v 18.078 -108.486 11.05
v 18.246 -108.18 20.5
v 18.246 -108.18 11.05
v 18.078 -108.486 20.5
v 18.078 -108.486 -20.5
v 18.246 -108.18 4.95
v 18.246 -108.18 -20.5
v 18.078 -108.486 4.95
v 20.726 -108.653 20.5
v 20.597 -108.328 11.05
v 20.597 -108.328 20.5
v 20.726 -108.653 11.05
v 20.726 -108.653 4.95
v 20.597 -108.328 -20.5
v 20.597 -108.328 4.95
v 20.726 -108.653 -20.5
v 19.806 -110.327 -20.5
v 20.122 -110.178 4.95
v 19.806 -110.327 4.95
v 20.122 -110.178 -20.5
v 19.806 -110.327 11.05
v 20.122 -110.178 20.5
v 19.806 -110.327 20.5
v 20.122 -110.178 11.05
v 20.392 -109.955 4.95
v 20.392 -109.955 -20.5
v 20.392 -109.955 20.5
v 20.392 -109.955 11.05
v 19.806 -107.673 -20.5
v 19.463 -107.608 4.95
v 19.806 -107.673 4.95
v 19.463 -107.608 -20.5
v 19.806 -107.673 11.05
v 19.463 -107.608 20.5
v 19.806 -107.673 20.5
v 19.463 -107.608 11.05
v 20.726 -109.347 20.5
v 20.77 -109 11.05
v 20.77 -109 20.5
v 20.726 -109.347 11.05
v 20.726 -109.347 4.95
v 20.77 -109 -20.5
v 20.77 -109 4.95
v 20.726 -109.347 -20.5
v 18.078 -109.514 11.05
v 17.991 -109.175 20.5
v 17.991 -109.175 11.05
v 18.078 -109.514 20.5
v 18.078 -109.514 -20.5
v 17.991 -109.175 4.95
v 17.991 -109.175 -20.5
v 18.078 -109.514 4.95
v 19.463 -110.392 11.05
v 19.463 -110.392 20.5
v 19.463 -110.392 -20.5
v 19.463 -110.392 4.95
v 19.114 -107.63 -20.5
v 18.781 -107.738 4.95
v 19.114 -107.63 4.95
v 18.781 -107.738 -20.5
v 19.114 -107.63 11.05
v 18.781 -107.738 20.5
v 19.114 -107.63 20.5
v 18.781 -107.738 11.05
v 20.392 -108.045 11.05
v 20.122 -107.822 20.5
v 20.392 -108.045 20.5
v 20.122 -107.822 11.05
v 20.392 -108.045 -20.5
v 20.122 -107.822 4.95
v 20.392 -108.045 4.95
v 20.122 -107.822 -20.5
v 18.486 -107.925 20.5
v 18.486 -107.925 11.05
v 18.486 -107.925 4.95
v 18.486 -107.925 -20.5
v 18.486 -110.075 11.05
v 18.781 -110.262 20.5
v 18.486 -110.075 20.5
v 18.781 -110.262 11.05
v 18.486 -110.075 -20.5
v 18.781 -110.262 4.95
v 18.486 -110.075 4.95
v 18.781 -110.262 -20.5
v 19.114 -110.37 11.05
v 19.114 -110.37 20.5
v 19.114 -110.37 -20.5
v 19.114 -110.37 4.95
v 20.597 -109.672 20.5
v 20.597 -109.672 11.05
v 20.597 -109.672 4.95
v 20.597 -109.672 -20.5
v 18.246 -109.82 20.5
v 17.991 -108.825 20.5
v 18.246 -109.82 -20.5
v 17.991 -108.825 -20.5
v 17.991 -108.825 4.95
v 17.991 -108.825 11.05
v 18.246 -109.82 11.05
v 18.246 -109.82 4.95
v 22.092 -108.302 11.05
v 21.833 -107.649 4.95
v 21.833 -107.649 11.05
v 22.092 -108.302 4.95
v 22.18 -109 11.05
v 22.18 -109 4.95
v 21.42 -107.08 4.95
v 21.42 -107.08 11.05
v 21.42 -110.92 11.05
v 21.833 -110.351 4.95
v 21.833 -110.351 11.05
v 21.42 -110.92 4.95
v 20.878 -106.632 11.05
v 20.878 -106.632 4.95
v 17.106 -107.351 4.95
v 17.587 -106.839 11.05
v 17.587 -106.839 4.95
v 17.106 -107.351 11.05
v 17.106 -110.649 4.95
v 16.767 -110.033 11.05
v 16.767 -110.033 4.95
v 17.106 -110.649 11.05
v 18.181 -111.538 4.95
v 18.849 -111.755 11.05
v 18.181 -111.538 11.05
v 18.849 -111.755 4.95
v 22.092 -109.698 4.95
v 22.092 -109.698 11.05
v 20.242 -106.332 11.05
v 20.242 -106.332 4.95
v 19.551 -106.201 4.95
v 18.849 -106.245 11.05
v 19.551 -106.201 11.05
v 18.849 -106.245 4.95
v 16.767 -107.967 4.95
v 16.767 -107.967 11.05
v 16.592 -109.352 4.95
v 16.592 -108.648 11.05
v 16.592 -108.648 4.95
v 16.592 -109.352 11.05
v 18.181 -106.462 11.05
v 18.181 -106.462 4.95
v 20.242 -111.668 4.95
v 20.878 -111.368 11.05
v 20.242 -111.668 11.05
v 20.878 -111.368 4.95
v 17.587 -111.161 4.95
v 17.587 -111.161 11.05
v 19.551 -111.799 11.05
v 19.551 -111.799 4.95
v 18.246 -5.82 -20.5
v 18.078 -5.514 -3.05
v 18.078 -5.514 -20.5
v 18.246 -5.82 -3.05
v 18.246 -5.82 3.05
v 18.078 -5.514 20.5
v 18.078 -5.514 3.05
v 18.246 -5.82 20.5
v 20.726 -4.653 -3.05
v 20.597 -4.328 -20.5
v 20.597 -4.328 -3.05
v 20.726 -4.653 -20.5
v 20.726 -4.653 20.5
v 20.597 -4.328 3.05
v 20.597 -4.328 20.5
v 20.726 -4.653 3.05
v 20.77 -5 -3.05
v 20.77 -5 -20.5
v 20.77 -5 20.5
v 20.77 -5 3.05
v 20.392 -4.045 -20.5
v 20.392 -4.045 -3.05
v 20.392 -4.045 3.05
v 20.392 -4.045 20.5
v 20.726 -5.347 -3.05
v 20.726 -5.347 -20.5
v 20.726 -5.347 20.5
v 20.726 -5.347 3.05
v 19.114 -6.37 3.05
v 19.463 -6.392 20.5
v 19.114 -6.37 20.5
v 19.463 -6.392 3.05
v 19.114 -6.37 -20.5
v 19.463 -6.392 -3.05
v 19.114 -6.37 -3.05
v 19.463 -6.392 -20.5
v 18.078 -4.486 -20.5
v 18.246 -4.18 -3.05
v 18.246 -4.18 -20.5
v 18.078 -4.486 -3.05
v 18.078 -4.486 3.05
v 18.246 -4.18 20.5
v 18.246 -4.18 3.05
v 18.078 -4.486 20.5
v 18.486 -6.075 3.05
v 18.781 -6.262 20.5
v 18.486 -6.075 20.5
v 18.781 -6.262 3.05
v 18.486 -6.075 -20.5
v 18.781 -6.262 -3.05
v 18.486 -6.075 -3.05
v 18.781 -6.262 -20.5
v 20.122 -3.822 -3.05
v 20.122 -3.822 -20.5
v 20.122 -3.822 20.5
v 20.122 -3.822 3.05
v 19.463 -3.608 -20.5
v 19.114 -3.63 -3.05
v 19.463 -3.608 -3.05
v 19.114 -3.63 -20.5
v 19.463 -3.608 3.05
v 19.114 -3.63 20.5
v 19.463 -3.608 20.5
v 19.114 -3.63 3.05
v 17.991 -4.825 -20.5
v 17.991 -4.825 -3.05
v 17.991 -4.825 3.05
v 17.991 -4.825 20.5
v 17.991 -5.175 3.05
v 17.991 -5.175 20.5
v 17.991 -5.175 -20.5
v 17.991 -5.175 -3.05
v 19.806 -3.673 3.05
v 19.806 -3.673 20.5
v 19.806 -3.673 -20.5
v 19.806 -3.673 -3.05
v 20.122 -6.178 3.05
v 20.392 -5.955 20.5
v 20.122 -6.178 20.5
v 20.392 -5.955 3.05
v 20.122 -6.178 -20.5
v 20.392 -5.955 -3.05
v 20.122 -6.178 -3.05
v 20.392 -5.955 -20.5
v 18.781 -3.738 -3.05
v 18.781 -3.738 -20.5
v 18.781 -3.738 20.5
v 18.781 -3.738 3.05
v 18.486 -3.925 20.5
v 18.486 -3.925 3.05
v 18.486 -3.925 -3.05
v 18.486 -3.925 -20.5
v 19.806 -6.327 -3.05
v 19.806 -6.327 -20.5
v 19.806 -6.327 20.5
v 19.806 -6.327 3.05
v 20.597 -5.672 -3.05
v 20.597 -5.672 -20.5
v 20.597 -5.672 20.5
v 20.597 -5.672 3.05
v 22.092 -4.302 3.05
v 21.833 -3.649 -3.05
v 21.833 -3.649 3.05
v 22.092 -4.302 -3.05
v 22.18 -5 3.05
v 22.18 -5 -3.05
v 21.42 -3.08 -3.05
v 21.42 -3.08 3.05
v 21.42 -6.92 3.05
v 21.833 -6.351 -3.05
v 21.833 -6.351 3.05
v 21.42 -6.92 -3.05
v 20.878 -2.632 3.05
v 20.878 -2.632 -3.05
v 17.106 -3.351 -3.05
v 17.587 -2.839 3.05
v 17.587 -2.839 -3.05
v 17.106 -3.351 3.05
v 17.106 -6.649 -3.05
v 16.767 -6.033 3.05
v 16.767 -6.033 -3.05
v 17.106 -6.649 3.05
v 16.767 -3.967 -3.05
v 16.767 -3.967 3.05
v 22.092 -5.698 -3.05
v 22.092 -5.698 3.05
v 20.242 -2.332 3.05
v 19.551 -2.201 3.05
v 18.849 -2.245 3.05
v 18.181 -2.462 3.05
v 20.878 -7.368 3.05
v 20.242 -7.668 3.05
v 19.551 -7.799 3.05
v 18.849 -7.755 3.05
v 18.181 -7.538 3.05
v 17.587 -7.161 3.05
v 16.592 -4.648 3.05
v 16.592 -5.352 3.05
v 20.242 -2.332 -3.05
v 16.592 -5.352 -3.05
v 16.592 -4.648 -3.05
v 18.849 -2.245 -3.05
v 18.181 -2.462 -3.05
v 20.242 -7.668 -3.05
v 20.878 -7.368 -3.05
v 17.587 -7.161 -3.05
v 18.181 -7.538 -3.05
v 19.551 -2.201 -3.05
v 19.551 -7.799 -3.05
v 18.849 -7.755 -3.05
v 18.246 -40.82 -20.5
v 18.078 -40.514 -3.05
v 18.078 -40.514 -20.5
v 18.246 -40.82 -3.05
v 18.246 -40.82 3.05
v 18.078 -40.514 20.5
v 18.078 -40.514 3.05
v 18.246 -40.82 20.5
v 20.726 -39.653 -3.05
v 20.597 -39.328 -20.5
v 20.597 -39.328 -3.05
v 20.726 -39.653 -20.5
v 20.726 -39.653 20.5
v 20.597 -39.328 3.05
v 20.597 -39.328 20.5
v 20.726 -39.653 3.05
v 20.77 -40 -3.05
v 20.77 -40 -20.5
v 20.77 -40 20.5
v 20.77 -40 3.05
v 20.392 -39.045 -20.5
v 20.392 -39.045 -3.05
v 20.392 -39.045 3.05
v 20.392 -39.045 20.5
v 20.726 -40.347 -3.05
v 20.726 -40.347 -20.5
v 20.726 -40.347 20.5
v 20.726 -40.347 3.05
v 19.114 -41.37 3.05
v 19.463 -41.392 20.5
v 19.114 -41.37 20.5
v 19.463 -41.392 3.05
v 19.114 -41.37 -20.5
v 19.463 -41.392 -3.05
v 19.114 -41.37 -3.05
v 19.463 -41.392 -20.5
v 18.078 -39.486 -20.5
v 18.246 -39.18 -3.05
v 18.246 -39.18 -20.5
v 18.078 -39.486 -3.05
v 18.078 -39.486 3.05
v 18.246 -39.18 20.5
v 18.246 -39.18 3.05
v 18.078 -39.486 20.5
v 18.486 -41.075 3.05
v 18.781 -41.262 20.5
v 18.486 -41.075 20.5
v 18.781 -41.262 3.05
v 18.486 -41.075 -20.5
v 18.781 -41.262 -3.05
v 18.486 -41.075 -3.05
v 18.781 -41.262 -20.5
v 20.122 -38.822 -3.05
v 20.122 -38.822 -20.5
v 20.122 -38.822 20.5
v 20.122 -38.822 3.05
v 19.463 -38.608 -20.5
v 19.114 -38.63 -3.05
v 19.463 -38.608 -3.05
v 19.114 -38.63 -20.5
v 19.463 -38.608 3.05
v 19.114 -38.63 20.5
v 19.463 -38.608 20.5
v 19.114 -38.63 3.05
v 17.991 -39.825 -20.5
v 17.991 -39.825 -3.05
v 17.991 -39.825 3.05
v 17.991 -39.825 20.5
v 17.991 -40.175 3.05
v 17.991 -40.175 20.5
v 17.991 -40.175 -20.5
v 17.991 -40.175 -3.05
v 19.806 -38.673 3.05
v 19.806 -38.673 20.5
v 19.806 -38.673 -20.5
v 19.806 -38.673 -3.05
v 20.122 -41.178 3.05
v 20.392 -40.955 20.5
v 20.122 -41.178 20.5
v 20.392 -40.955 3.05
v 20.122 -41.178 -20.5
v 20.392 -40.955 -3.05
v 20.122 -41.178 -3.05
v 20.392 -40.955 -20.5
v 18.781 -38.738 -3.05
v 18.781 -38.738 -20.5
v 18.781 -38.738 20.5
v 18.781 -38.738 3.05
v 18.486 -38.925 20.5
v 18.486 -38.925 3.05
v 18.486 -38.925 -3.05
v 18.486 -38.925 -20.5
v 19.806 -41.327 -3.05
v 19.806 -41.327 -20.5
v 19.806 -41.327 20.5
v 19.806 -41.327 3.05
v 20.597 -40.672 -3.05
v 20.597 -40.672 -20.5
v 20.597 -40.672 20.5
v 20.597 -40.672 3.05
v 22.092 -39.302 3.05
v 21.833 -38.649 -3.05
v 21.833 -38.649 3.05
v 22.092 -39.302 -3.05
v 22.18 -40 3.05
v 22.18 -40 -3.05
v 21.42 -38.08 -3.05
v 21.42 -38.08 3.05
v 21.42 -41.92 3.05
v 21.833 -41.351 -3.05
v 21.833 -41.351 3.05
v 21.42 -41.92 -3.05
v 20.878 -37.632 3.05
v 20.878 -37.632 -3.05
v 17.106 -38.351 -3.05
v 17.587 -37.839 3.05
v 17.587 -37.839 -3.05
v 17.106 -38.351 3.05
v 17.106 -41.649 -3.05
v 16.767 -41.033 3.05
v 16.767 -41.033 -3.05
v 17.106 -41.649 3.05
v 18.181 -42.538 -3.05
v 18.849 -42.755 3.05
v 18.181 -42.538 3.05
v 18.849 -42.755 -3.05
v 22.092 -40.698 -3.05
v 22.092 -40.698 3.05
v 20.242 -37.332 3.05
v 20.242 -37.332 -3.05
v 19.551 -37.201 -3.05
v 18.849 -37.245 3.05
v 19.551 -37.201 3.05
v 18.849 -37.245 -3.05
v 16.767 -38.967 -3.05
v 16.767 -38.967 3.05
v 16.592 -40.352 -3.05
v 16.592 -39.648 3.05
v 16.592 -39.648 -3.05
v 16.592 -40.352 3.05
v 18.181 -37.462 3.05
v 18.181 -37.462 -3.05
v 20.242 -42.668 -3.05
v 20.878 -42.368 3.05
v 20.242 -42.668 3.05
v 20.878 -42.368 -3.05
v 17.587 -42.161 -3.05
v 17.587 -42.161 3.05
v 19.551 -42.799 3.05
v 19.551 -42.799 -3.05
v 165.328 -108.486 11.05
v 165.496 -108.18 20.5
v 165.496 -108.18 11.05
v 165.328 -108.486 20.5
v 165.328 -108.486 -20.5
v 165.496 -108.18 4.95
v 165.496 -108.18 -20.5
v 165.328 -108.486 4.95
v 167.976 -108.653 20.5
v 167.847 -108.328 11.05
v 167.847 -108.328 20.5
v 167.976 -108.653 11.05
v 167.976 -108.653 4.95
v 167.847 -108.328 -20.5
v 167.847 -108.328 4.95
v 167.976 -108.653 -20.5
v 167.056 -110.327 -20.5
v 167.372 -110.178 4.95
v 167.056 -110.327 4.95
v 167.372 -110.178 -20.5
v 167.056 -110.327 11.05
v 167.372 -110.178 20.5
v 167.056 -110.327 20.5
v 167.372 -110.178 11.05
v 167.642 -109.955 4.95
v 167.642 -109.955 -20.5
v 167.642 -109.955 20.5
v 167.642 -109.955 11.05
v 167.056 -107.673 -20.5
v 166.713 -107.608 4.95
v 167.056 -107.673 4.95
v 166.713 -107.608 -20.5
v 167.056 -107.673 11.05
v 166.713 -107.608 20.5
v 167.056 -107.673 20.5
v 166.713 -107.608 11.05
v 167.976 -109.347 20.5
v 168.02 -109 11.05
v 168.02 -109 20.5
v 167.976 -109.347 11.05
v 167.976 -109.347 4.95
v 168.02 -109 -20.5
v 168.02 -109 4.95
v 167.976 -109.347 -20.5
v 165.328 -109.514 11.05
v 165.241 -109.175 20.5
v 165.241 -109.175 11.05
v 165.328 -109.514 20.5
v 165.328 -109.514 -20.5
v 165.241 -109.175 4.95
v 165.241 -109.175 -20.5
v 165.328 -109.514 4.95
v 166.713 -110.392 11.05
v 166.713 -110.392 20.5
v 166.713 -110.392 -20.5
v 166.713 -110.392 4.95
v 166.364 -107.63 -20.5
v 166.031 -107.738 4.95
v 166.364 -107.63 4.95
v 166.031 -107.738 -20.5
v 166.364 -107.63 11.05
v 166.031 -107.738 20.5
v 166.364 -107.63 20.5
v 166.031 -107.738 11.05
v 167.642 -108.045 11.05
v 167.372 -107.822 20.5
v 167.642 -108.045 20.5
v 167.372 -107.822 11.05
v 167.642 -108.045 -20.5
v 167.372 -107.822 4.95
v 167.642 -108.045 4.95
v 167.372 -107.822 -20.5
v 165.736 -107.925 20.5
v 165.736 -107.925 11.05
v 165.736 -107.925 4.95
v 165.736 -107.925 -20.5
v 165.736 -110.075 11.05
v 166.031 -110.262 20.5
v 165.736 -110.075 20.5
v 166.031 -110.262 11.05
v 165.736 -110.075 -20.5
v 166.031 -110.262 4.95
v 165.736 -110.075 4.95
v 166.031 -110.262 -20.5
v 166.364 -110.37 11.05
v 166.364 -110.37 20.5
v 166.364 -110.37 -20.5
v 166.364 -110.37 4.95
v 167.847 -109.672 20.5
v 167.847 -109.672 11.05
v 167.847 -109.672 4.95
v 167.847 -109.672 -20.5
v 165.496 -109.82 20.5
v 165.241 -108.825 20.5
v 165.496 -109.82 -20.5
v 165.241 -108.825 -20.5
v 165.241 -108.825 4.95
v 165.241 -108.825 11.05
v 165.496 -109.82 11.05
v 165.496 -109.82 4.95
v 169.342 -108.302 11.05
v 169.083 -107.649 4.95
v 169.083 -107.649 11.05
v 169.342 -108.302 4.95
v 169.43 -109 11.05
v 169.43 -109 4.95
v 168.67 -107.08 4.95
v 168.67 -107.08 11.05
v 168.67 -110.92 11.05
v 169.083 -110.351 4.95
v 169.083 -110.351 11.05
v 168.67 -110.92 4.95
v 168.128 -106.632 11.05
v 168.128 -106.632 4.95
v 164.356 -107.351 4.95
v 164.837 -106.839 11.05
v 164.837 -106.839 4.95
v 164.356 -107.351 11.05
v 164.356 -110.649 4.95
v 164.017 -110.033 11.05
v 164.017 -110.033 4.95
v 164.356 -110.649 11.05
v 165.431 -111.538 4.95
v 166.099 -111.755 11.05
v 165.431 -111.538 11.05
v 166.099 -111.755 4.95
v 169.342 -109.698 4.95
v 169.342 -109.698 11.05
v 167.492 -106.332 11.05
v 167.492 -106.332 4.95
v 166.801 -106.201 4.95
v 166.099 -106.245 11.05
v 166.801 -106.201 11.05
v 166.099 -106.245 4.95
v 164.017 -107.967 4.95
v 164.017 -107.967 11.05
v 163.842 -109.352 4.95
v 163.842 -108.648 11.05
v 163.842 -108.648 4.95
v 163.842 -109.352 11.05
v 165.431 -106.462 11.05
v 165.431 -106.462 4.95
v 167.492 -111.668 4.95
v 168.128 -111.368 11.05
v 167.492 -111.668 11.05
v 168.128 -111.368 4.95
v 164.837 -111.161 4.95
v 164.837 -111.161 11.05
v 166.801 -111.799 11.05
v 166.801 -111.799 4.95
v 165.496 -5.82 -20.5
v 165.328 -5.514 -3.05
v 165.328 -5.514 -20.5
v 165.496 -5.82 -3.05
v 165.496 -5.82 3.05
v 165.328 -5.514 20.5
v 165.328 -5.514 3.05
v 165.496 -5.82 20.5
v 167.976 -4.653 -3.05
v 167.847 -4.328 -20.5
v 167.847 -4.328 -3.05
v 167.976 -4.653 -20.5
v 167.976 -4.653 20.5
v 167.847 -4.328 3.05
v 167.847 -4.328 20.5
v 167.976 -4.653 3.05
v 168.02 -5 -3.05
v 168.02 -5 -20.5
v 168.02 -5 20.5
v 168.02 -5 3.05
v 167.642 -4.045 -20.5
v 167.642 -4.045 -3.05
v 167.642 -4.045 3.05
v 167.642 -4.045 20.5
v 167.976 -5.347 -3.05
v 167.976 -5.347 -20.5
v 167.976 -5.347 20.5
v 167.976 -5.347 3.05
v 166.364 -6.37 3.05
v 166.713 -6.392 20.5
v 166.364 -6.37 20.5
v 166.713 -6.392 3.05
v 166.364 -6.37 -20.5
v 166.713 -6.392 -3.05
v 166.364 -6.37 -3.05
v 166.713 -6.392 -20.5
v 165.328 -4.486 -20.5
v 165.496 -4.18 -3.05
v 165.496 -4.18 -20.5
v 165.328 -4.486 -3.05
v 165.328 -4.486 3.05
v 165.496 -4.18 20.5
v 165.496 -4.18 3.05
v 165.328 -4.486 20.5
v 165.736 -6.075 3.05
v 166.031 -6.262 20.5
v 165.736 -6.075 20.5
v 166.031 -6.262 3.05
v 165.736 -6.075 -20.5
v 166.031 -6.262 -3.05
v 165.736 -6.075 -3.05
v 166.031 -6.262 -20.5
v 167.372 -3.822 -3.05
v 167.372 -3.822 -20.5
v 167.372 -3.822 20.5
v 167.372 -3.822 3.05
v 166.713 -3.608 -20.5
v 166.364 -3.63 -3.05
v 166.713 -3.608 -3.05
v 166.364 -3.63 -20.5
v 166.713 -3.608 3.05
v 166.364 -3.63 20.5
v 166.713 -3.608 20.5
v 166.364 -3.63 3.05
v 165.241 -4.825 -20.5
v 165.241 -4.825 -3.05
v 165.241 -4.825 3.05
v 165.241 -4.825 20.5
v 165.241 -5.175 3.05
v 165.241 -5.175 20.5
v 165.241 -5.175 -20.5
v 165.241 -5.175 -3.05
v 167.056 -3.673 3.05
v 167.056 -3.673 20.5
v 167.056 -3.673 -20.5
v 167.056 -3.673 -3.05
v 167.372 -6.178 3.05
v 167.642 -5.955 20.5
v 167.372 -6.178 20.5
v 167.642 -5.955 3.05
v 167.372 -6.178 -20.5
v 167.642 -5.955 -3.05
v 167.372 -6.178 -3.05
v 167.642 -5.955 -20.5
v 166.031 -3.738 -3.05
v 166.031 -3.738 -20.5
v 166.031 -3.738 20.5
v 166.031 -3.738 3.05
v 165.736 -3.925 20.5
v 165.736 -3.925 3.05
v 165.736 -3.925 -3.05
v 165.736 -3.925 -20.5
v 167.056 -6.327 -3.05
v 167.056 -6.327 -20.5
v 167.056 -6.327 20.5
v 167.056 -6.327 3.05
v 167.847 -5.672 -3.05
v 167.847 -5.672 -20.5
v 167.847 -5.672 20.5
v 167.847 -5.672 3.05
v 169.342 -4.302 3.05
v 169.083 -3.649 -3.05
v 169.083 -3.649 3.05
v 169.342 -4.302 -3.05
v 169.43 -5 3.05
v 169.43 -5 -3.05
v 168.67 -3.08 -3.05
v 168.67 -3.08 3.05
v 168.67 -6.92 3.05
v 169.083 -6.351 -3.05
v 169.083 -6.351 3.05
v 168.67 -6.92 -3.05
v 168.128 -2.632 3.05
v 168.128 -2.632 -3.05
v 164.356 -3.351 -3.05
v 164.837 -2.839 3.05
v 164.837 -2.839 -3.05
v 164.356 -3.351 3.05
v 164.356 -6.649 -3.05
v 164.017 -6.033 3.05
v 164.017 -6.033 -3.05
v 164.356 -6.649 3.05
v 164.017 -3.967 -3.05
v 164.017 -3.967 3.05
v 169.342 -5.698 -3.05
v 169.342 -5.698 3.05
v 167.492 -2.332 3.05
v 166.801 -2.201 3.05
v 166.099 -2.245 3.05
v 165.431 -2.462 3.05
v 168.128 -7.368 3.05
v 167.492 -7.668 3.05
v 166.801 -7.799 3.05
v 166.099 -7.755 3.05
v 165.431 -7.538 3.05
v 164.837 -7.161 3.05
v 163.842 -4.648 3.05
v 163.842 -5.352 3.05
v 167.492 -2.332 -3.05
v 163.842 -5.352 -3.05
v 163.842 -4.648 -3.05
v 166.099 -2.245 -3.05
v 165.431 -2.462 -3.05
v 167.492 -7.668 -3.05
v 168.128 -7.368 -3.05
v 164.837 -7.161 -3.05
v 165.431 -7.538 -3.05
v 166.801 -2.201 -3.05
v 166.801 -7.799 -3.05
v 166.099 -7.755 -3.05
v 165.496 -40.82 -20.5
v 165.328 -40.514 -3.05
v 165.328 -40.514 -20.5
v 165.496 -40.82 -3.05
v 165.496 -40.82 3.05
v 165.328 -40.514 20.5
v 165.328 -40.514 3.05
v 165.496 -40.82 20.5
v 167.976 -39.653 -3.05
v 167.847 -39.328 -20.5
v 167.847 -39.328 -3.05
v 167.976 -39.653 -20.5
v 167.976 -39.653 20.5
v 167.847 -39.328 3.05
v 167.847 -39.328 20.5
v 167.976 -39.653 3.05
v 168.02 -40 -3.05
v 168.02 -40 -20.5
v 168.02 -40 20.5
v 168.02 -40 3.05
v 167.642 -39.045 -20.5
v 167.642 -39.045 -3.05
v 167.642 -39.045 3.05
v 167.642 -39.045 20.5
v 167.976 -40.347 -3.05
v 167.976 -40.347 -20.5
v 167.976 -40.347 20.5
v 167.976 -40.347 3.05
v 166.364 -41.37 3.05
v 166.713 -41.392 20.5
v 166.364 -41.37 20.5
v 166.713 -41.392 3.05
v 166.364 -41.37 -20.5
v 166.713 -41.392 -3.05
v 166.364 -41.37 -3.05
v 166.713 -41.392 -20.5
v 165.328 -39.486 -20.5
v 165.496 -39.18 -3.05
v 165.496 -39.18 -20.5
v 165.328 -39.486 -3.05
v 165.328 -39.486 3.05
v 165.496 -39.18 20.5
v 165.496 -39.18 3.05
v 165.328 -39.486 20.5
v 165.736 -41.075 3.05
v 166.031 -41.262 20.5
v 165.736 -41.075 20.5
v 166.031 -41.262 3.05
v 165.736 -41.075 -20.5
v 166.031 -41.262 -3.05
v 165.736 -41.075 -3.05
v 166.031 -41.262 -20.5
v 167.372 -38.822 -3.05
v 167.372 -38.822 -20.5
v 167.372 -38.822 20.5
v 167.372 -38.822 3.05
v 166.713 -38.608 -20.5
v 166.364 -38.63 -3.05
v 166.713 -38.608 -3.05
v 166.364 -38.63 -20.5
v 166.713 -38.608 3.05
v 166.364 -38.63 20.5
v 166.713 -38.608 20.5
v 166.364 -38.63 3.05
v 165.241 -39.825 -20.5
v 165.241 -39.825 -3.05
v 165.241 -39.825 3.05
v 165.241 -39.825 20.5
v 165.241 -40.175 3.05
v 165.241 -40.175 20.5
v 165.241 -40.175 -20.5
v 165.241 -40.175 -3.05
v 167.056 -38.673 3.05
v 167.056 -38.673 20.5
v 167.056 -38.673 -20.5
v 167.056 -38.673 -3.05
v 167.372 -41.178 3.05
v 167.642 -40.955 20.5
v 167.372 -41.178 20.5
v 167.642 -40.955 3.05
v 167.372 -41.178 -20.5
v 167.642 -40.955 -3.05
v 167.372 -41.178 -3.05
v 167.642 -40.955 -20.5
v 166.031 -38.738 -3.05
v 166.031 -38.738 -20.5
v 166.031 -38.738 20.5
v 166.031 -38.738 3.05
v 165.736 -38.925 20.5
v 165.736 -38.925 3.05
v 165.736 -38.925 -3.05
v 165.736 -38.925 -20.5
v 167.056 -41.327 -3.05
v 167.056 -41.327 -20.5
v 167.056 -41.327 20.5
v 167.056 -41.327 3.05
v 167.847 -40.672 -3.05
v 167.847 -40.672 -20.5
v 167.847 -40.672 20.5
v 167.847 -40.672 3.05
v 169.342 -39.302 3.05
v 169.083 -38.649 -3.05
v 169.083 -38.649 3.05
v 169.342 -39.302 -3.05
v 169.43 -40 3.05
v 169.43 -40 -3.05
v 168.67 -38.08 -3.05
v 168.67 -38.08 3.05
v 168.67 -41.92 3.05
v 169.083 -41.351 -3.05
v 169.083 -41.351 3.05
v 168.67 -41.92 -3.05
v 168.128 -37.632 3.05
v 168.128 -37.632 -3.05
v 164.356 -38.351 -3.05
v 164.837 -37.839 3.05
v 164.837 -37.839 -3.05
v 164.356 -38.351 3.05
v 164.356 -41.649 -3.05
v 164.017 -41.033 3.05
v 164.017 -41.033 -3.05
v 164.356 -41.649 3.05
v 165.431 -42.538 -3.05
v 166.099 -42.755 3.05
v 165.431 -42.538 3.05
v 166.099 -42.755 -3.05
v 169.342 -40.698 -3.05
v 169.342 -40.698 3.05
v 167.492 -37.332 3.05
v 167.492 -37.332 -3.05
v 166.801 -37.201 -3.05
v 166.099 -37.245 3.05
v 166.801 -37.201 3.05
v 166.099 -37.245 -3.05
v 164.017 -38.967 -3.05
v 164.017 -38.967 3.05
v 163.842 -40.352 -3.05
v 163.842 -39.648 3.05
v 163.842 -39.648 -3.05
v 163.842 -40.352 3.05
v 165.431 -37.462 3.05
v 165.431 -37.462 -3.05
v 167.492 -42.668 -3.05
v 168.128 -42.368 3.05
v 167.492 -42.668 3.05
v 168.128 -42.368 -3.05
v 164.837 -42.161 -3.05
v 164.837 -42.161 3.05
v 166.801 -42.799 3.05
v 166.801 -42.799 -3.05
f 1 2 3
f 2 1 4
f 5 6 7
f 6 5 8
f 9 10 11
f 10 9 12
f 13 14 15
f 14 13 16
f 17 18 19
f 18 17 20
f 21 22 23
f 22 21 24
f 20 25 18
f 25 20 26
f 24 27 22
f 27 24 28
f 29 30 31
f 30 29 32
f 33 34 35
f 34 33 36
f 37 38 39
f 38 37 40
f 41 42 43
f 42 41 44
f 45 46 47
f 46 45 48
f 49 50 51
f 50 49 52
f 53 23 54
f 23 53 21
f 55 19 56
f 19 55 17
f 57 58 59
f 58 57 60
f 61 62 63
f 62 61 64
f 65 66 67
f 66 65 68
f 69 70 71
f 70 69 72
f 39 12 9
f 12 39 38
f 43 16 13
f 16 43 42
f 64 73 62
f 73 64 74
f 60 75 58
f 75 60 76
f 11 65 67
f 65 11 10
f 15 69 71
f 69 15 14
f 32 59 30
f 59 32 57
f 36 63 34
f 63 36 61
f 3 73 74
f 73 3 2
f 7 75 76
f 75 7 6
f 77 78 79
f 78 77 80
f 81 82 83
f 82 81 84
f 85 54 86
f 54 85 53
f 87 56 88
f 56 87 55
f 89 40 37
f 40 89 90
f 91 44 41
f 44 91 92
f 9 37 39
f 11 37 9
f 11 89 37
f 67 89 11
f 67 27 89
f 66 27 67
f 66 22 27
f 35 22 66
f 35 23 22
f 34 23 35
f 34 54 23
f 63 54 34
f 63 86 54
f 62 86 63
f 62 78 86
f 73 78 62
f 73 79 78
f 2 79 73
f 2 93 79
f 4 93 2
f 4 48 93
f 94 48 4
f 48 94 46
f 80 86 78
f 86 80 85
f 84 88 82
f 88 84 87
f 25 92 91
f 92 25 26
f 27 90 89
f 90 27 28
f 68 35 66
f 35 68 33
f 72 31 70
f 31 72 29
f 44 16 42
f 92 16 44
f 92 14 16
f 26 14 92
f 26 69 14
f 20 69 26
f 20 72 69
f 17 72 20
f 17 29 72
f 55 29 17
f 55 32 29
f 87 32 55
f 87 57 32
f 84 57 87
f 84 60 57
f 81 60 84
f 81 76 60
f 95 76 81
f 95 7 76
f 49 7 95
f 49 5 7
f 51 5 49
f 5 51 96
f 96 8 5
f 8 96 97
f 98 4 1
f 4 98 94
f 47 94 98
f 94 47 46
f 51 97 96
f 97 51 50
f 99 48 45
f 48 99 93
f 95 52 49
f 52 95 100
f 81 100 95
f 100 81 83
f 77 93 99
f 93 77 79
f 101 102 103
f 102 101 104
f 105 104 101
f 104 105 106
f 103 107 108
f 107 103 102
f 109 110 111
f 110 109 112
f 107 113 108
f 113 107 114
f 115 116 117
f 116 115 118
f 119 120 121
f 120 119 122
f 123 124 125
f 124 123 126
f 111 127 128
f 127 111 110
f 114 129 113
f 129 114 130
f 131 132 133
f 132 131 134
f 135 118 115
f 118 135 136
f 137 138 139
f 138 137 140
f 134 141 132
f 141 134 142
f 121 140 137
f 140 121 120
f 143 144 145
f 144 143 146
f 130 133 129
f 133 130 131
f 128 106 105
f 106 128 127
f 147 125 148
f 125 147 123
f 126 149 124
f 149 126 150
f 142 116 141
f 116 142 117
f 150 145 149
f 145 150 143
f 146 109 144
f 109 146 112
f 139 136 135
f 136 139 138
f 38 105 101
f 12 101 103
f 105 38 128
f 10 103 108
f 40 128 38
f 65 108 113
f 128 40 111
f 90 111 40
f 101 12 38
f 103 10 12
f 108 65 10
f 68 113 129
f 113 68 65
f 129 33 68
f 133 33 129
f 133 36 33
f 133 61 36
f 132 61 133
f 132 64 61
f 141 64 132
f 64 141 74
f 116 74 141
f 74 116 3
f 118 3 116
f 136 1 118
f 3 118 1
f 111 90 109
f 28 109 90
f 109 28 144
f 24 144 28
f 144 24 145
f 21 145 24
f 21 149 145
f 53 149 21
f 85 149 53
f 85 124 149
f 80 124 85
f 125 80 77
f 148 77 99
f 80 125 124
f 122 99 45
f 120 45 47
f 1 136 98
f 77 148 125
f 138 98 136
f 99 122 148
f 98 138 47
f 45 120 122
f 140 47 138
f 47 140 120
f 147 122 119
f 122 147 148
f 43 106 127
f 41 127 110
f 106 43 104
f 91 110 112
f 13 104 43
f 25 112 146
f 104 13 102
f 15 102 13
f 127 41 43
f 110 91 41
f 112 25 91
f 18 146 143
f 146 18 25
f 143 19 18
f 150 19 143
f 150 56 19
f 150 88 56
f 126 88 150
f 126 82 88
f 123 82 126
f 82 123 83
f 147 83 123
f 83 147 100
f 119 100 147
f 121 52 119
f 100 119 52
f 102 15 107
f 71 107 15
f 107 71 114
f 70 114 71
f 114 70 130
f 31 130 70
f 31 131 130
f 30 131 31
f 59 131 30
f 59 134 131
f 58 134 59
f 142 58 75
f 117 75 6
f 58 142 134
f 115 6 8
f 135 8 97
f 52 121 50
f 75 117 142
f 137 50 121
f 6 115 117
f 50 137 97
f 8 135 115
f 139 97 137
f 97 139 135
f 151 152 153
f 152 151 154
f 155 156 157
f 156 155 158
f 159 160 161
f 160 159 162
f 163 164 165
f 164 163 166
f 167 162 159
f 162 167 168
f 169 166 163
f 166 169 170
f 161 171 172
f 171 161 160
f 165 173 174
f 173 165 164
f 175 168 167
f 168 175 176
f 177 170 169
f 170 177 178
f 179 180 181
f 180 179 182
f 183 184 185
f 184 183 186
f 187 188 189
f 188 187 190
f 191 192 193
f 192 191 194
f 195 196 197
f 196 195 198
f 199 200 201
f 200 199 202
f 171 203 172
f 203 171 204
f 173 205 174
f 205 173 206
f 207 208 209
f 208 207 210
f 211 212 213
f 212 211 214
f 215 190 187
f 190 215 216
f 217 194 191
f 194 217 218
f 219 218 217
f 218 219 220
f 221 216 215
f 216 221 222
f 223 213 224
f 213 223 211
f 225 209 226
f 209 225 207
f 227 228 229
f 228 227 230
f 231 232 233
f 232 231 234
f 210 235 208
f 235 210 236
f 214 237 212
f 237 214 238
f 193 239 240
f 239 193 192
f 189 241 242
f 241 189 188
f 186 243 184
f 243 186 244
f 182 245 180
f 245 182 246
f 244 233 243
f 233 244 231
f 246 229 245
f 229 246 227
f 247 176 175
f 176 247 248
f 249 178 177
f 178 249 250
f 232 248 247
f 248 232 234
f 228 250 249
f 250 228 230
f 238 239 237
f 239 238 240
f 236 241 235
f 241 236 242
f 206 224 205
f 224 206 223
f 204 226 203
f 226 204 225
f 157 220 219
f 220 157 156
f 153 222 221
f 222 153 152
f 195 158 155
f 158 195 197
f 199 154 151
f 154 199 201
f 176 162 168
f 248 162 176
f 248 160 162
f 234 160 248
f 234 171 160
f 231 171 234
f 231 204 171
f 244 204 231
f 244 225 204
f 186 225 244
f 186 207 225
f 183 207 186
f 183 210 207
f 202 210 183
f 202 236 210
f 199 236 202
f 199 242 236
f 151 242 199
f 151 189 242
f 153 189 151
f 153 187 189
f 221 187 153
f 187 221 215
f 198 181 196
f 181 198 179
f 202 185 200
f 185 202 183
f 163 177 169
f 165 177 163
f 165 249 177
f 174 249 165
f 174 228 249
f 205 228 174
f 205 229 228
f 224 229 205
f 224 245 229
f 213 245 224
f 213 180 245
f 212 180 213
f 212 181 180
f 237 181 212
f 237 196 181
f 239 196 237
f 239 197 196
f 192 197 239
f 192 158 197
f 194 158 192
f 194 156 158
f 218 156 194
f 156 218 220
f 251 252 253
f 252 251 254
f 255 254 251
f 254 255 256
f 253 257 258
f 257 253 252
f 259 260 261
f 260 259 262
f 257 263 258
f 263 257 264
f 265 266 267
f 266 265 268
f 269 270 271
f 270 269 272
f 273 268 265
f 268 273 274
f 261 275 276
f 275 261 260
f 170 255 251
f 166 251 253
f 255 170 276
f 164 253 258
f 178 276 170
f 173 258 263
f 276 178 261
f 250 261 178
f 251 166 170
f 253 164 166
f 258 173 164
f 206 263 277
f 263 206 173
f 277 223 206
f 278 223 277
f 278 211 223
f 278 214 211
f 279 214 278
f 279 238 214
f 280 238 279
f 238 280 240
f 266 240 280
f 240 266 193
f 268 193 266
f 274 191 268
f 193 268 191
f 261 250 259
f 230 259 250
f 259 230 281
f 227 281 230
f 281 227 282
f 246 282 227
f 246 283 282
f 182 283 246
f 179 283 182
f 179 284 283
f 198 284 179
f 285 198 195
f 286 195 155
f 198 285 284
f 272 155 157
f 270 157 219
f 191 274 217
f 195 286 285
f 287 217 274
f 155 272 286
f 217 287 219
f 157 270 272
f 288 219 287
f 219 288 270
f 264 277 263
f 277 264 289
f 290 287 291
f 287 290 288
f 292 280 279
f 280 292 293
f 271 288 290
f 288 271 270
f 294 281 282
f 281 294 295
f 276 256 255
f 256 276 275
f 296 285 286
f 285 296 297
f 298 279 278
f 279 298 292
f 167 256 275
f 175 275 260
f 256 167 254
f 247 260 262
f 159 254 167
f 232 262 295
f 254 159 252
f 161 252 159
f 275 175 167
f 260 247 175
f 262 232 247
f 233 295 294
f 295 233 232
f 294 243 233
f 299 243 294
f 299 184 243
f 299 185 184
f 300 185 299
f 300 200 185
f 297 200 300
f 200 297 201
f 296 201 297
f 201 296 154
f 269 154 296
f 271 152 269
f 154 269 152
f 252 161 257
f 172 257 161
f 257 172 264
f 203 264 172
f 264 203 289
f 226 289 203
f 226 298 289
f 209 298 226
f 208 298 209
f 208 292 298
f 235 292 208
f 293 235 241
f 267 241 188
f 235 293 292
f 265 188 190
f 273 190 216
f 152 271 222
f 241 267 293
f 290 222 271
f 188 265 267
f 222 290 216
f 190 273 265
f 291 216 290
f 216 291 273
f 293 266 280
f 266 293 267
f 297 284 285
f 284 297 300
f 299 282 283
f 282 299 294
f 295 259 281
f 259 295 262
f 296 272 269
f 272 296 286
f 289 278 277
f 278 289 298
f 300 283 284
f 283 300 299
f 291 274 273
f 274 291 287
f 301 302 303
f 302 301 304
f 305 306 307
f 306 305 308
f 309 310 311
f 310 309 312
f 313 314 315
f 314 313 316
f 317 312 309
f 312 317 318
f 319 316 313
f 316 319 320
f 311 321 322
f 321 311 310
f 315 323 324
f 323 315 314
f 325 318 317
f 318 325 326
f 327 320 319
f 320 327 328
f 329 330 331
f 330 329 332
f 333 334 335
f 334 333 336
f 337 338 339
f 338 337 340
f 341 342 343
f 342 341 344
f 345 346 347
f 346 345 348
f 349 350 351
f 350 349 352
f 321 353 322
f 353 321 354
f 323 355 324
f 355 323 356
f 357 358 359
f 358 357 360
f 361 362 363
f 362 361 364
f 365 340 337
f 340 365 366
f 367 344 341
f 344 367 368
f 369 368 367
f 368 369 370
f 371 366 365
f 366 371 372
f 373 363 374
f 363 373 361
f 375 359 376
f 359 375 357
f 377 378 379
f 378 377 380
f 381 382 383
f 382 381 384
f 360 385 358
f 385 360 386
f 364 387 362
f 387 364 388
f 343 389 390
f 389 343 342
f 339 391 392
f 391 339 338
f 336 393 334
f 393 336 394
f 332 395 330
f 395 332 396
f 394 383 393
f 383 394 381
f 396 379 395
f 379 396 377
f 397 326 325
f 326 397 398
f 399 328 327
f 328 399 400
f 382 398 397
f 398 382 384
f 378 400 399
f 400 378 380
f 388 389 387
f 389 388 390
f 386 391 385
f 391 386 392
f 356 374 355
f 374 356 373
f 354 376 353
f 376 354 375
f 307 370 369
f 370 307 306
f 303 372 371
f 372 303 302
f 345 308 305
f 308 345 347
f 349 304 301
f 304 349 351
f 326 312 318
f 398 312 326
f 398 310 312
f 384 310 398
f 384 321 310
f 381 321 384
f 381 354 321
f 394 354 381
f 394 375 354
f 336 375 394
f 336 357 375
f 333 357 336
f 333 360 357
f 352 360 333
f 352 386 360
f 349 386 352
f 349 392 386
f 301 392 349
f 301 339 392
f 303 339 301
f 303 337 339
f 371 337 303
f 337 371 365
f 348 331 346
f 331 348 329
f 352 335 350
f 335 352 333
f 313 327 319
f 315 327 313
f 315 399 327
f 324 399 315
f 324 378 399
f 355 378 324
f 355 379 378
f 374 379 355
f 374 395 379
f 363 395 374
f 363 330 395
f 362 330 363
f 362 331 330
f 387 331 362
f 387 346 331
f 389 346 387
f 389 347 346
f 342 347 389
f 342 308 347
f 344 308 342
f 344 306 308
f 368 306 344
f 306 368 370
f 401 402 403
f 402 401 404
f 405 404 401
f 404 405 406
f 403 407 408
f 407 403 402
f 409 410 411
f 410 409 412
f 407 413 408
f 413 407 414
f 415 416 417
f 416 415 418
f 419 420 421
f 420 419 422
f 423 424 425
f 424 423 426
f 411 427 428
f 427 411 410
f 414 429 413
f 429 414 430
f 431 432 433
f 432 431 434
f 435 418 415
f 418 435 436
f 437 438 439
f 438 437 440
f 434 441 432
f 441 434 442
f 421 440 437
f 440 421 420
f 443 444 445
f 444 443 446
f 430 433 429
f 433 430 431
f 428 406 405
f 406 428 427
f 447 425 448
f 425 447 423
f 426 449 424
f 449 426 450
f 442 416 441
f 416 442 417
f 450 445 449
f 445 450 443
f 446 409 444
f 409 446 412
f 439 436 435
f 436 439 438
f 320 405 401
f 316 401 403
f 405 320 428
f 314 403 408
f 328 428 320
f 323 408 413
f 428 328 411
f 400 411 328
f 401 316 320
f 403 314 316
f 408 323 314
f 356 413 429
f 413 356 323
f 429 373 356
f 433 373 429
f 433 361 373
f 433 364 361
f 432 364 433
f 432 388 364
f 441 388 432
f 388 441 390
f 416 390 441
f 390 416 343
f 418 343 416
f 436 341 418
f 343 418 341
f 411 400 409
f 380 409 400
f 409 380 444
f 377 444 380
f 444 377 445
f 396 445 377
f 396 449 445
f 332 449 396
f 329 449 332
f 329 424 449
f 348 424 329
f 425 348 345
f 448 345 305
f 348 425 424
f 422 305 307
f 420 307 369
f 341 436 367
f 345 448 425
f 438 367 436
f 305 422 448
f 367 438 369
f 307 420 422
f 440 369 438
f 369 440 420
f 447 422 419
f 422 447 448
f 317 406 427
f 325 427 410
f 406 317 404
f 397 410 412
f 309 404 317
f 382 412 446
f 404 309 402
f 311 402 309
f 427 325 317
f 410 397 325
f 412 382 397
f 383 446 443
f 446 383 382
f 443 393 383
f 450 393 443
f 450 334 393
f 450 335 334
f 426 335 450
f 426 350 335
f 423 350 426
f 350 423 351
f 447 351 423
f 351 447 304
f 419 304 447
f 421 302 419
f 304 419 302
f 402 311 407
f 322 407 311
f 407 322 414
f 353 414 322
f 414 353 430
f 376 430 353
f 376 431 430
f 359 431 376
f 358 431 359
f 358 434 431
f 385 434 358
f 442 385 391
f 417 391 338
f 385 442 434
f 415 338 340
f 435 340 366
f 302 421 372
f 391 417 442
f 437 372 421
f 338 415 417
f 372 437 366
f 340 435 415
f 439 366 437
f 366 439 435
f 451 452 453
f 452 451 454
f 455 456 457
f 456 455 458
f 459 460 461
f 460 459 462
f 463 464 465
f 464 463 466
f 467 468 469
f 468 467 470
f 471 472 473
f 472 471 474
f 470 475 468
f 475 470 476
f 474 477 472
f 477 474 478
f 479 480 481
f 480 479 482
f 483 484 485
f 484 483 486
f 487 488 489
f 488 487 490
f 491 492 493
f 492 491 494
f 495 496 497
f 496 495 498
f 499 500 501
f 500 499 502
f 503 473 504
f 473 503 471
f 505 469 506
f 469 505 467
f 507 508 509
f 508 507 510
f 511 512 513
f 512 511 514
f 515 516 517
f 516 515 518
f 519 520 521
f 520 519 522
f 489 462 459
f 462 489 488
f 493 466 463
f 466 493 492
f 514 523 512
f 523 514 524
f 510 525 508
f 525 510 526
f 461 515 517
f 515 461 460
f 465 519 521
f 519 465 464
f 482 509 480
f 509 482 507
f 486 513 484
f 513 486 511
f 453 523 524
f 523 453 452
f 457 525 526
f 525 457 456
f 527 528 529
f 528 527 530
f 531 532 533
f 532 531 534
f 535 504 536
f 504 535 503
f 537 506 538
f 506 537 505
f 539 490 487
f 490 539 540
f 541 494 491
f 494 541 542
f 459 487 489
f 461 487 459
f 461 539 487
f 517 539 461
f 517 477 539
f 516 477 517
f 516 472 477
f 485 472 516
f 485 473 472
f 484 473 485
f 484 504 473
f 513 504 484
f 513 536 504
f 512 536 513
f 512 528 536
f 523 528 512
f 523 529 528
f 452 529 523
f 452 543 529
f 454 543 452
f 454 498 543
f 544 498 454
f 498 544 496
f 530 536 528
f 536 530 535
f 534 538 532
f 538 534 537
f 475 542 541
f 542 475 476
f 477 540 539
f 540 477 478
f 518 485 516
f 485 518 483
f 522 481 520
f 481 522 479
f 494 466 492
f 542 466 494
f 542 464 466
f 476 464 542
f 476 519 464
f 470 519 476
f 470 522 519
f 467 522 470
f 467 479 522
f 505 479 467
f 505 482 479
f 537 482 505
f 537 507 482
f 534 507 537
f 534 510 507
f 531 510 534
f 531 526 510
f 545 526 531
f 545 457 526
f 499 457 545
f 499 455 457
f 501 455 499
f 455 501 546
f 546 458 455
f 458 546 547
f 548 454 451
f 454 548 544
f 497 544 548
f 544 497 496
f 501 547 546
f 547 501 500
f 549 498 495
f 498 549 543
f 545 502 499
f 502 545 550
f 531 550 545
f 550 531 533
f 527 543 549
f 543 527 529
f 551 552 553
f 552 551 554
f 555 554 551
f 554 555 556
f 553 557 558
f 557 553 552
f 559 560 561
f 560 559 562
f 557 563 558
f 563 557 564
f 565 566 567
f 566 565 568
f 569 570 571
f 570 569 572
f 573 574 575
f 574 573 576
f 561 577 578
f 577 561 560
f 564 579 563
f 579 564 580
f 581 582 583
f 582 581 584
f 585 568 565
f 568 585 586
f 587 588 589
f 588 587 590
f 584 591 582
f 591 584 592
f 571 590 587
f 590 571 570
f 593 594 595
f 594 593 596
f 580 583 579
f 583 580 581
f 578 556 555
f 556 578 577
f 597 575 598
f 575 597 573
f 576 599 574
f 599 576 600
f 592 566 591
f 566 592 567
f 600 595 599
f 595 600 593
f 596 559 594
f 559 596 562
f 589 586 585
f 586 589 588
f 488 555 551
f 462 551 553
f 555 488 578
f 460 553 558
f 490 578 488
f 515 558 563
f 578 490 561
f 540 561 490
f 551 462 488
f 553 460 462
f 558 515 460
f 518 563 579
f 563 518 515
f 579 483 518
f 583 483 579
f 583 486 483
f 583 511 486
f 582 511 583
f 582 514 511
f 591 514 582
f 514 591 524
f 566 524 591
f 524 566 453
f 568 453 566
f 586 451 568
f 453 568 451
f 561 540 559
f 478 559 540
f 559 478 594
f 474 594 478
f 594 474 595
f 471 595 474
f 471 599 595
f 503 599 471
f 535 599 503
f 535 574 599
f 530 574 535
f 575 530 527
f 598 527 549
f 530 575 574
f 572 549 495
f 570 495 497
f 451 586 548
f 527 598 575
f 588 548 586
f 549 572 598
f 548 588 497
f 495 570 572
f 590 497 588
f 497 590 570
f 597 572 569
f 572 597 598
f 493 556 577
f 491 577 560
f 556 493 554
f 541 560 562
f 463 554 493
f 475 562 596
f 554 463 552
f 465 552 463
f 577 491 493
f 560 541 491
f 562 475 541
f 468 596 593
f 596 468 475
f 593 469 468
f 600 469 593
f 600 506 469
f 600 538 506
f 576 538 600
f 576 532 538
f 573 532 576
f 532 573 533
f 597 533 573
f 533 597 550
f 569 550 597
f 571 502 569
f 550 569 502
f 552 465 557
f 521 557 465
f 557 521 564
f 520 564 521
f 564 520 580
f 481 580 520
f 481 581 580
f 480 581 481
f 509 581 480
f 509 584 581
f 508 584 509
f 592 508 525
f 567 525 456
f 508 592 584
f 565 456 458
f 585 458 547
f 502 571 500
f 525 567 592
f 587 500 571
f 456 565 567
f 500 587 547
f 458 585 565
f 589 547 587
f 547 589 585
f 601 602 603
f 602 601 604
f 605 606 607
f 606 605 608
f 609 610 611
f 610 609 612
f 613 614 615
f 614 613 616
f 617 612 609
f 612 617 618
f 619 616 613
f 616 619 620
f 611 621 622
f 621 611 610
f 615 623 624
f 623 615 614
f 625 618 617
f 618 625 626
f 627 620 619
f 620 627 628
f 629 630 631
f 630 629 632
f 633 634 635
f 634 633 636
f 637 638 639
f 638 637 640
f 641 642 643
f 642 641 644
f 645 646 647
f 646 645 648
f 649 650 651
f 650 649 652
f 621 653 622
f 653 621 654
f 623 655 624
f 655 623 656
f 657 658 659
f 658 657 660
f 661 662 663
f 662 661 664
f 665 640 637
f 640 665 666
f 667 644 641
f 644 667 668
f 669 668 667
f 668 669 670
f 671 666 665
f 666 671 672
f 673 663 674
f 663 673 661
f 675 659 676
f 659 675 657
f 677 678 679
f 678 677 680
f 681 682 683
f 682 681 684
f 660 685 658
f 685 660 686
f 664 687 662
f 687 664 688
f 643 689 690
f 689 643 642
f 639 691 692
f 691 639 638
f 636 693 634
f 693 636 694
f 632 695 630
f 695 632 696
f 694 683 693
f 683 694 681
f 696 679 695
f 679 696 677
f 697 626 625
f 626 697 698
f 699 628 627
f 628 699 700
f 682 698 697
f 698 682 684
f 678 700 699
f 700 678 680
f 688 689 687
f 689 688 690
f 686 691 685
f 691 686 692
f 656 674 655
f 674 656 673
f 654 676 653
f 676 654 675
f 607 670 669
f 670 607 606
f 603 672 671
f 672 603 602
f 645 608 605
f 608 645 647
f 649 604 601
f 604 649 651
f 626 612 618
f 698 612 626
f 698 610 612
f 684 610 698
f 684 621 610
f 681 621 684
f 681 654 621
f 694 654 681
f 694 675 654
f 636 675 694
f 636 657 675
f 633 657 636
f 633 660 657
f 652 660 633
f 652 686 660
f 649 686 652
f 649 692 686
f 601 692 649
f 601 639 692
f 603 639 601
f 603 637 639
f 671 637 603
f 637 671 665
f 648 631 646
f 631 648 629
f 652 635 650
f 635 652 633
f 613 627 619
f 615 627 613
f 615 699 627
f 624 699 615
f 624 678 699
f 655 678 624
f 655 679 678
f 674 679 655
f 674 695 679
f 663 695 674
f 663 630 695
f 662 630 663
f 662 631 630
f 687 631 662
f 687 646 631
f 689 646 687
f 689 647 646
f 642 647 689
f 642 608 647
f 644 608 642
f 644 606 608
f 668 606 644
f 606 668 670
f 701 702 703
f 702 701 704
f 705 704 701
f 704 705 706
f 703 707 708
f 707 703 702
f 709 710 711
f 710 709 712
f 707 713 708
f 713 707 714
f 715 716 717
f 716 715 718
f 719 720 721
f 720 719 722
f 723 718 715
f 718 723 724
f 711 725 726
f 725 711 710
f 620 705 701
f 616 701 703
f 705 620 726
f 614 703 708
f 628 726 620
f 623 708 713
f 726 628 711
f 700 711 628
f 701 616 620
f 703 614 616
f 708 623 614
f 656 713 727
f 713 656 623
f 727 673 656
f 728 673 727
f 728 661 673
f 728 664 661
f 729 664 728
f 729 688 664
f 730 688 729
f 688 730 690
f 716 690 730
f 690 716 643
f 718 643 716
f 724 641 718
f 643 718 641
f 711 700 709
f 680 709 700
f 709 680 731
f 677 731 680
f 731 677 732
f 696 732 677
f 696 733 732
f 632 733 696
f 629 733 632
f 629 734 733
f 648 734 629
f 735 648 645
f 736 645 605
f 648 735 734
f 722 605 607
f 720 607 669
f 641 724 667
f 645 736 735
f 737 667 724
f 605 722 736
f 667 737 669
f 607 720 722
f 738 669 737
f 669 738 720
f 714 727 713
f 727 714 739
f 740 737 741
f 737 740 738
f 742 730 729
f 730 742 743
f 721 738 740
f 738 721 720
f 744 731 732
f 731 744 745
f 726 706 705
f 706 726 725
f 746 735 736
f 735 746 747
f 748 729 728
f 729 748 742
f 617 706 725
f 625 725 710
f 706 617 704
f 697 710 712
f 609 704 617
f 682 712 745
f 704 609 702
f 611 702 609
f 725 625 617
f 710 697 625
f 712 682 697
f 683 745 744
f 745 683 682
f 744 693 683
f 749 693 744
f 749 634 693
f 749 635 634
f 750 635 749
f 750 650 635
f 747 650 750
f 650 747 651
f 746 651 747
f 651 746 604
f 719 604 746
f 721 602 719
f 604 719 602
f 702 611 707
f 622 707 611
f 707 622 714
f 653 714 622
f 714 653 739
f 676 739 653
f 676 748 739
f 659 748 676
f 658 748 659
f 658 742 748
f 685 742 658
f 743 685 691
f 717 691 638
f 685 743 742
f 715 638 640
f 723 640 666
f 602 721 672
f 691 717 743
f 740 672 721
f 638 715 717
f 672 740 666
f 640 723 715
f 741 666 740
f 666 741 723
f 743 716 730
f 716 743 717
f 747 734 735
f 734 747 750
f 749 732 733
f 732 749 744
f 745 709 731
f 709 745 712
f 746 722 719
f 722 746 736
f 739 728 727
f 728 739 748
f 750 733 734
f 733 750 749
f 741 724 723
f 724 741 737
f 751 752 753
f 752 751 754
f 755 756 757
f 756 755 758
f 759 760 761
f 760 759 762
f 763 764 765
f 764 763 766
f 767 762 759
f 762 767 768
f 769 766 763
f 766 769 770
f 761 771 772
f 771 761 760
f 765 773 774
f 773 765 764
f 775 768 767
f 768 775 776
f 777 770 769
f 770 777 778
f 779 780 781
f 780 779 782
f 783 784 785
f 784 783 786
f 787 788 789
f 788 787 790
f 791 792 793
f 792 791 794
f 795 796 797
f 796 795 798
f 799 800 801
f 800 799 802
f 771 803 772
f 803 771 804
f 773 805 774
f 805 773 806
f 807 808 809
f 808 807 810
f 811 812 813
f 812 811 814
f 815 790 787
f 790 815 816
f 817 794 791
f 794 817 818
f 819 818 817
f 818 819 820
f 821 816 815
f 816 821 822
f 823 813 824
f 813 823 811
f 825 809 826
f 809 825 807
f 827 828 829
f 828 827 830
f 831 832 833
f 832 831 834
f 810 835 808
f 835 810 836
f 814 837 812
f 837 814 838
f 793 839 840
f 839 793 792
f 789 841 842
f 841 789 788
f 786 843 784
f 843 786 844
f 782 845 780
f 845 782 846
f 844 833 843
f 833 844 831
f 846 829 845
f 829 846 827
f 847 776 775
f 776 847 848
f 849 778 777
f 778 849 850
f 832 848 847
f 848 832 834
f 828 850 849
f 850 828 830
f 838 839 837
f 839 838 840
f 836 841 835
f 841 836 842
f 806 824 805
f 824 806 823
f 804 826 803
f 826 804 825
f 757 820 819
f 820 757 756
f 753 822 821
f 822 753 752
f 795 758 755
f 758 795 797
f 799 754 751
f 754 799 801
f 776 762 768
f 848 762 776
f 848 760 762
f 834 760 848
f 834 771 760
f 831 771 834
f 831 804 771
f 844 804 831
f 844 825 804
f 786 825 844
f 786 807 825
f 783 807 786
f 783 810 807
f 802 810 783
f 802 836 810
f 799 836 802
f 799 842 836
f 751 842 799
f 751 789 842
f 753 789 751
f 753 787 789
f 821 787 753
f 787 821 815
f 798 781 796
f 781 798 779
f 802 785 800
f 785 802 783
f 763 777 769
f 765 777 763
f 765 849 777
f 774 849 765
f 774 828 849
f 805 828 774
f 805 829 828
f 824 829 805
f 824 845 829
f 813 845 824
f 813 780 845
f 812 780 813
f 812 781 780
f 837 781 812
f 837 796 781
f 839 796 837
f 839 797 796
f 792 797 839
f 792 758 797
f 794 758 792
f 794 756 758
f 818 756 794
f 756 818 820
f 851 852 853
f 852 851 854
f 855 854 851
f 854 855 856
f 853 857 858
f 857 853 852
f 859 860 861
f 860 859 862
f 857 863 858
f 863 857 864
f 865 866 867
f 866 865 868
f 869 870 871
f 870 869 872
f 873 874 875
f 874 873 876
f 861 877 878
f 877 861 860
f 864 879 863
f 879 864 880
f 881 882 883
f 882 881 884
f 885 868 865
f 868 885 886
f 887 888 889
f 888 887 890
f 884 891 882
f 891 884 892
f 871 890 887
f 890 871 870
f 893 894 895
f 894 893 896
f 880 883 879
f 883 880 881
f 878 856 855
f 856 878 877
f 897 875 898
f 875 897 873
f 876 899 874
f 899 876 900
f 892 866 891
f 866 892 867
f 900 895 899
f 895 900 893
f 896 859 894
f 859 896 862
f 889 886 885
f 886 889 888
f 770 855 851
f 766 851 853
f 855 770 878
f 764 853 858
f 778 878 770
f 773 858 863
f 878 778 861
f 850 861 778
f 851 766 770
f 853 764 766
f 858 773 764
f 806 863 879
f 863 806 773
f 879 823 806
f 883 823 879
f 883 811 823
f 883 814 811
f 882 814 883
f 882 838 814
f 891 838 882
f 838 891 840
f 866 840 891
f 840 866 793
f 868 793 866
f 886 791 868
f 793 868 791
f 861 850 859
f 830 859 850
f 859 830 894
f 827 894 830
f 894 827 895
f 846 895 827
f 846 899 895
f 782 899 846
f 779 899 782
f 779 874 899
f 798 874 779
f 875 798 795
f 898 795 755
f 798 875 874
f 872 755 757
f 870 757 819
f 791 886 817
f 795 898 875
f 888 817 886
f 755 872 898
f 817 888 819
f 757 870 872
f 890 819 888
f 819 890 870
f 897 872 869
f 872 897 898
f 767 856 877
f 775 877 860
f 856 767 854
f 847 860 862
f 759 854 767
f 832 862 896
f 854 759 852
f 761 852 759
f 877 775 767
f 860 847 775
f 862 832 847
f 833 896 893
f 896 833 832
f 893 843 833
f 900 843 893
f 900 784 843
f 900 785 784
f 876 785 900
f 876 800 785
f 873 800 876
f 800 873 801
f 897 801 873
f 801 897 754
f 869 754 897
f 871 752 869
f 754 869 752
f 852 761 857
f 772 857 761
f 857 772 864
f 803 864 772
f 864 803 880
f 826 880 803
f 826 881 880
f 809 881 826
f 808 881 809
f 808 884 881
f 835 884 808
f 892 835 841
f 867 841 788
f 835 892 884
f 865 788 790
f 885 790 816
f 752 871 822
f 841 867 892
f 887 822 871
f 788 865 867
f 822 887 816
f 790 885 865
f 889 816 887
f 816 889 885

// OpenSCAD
// file: params.scad
/*

Values in `camelCase` are user-variable (within reason); 
values like numNeedles and screwDiam, etc.,  can be modified to
accommodate user preference or hardware subsitution. 

Values in `ALL_CAPS` should be considered CONSTANTS and should
only be modified with *extreme caution* as they will affect the 
relationship between the needles and the cams, which could
prevent stitches from forming correctly.

I recommend only modifying these constants if you are also 
making changes to the cam design in the technical sketch.
*/

$fn = 50;

STANDARD_GAUGE = 4.5;
MID_GAUGE = 6.5;
BULKY_GAUGE = 9.0;
BRIAN_GAUGE = 7.75;

gauge = BRIAN_GAUGE;
// gauge = STANDARD_GAUGE; // I recommend using one of the predefined gauges above
numNeedles = 25;
tolerance = 0.2; // allows a bit of room for parts that have to fit together; adjust according to your printer's precision

// ---
// Hardware dimensions 
// (actual measurements, no tolerances)

// - pan head 6-32 machine screws
screwDiam = 3.45;
screwHeight = 18;
screwHeadDiam = 6.75 + tolerance * 2; 
screwHeadHeight = 2.55 + tolerance * 2;
nutWidth = 7.9;

// - pan head 4-40 machine screws (M3 should also work where these are used)
screwDiamSm = 2.79;
screwHeightSm = 14.62;
screwHeadHeightSm = 2.41 + tolerance * 2;
screwHeadDiamSm = 5.21 + tolerance * 2;
nutHeight = 2.8;

// ---
// Needle dimensions
// - Brother needles
BUTT_HEIGHT = 15;
NEEDLE_WIDTH = 1.25;
NEEDLE_LEG_HEIGHT = 1.85;
HOOK_DIAM = 3.5;

// ---
// Needle Bed Zones
BACK_COVER = 45;
OOW_TRACK = 8;
B_TRACK = 42; // will divvy up working tracks (B & C position) later
C_TRACK = 0;
WORKING_TRACK = B_TRACK + C_TRACK;
HOLD_TRACK = 8;
SPONGE_BAR = 12;
COMB = 29;
NEEDLE_EXTENSION = 34.5;

// ---
// Needle bed dimensions
NEEDLE_BED_DEPTH = BACK_COVER + OOW_TRACK + WORKING_TRACK + HOLD_TRACK + SPONGE_BAR + COMB;
needleBedHeight = screwHeight + 2;
needleSlotHeight = NEEDLE_LEG_HEIGHT * 2 + screwHeadHeight;
needleSlotWidth = NEEDLE_WIDTH + 0.25; // add a small amount of clearance
combWidth = gauge*2/3; // width of cutouts for stitch formation; this gives room for the thickness of the yarn looped around the needle when it pulls back into the slot, but has to balance leaving enough material for the remaining "teeth" to not be too fragile
spongeThickness = 2.5;
spongeBarThickness = needleSlotHeight - NEEDLE_LEG_HEIGHT - spongeThickness;
YARN_DEPOSIT_Y = -155.1;
YARN_DEPOSIT_Z = -needleSlotHeight + HOOK_DIAM;
connectorOffset = 20;

screwPlacement = 3; // how many needles from edge of bed; min 2, max floor(numNeedles/2)

// ---
// Carriage dimensions
// refer to technical sketch
camHeight = BUTT_HEIGHT; // thickness of the tracks the needles ride along
camPlateHeight = 4; // plate behind the cams
CAM_PLATE_WIDTH = 91 * 2; 
CAM_PLATE_DEPTH = NEEDLE_BED_DEPTH - COMB + 6;

railDepth = 8;
railHeight = 8; // ???
xOffset = 16.5;
//vCamScrews = [[34-xOffset, -90.25, 0],[58-xOffset, -74.25, 0],[86-xOffset,-90.25, 0]];

echo(needleSlotHeight);
// main file
include<params.scad>;
//include<needlebed.scad>;

module screwHoles(screw) {
    
    
    // "screw" is passed in during the loop to place holes at either end of the assembly
    if (screw > 0) { //left half
       // spongebar screw
       translate([gauge/2,-(NEEDLE_BED_DEPTH-COMB) + SPONGE_BAR/2, 0]) {
         cylinder(h = needleBedHeight*2 + 1, d = screwDiamSm, center = true, $fn = 25); 
         translate([0,0,railHeight]) 
             cylinder(h = screwHeadHeight*2 + tolerance, d = screwHeadDiamSm, center = true, $fn = 25);   
       }
       // back screw, back cover
       translate([gauge/2, -5, 0]) {
         cylinder(h = needleBedHeight*2 + 1, d = screwDiamSm, center = true, $fn = 25);
                cylinder(h = screwHeadHeight*2 + tolerance, d = screwHeadDiamSm, center = true, $fn = 25);   
       }    
         // front screw, back cover
       translate([gauge/2, -BACK_COVER + 5, 0]) {
         cylinder(h = needleBedHeight*2 + 1, d = screwDiamSm, center = true, $fn = 25);  
          cylinder(h = screwHeadHeight*2 + tolerance, d = screwHeadDiamSm, center = true, $fn = 25);   
       }
     }
     
     if (screw < 0) { //right half
       // spongebar screw
       translate([-gauge/2,-(NEEDLE_BED_DEPTH-COMB) + SPONGE_BAR/2, 0]) {
         cylinder(h = needleBedHeight*2 + 1, d = screwDiamSm, center = true, $fn = 25); 
         translate([0,0,railHeight]) 
             cylinder(h = screwHeadHeight*2 + tolerance, d = screwHeadDiamSm, center = true, $fn = 25);   
       }
       // back screw, back cover
       translate([-gauge/2, -5, 0]) {
         cylinder(h = needleBedHeight*2 + 1, d = screwDiamSm, center = true, $fn = 25);
                cylinder(h = screwHeadHeight*2 + tolerance, d = screwHeadDiamSm, center = true, $fn = 25);   
       }    
         // front screw, back cover
       translate([-gauge/2, -BACK_COVER + 5, 0]) {
         cylinder(h = needleBedHeight*2 + 1, d = screwDiamSm, center = true, $fn = 25);  
          cylinder(h = screwHeadHeight*2 + tolerance, d = screwHeadDiamSm, center = true, $fn = 25);   
       }
     }
  
}

//screwHoles(screw = 1);
module needleBedScrews() {
    for(i = [0:numNeedles-1]) {
        if (i==screwPlacement || i==numNeedles-screwPlacement) {
              translate([gauge*i, 0, 0]) {
              screwHoles(screw = -1); 
              }
        } else if (i == screwPlacement - 1 || i==numNeedles-(screwPlacement + 1)) {
            //LS screw holes
                translate([gauge*i, 0, 0])
                screwHoles(screw = 1);  
        }
    }
}

needleBedScrews() {
}
